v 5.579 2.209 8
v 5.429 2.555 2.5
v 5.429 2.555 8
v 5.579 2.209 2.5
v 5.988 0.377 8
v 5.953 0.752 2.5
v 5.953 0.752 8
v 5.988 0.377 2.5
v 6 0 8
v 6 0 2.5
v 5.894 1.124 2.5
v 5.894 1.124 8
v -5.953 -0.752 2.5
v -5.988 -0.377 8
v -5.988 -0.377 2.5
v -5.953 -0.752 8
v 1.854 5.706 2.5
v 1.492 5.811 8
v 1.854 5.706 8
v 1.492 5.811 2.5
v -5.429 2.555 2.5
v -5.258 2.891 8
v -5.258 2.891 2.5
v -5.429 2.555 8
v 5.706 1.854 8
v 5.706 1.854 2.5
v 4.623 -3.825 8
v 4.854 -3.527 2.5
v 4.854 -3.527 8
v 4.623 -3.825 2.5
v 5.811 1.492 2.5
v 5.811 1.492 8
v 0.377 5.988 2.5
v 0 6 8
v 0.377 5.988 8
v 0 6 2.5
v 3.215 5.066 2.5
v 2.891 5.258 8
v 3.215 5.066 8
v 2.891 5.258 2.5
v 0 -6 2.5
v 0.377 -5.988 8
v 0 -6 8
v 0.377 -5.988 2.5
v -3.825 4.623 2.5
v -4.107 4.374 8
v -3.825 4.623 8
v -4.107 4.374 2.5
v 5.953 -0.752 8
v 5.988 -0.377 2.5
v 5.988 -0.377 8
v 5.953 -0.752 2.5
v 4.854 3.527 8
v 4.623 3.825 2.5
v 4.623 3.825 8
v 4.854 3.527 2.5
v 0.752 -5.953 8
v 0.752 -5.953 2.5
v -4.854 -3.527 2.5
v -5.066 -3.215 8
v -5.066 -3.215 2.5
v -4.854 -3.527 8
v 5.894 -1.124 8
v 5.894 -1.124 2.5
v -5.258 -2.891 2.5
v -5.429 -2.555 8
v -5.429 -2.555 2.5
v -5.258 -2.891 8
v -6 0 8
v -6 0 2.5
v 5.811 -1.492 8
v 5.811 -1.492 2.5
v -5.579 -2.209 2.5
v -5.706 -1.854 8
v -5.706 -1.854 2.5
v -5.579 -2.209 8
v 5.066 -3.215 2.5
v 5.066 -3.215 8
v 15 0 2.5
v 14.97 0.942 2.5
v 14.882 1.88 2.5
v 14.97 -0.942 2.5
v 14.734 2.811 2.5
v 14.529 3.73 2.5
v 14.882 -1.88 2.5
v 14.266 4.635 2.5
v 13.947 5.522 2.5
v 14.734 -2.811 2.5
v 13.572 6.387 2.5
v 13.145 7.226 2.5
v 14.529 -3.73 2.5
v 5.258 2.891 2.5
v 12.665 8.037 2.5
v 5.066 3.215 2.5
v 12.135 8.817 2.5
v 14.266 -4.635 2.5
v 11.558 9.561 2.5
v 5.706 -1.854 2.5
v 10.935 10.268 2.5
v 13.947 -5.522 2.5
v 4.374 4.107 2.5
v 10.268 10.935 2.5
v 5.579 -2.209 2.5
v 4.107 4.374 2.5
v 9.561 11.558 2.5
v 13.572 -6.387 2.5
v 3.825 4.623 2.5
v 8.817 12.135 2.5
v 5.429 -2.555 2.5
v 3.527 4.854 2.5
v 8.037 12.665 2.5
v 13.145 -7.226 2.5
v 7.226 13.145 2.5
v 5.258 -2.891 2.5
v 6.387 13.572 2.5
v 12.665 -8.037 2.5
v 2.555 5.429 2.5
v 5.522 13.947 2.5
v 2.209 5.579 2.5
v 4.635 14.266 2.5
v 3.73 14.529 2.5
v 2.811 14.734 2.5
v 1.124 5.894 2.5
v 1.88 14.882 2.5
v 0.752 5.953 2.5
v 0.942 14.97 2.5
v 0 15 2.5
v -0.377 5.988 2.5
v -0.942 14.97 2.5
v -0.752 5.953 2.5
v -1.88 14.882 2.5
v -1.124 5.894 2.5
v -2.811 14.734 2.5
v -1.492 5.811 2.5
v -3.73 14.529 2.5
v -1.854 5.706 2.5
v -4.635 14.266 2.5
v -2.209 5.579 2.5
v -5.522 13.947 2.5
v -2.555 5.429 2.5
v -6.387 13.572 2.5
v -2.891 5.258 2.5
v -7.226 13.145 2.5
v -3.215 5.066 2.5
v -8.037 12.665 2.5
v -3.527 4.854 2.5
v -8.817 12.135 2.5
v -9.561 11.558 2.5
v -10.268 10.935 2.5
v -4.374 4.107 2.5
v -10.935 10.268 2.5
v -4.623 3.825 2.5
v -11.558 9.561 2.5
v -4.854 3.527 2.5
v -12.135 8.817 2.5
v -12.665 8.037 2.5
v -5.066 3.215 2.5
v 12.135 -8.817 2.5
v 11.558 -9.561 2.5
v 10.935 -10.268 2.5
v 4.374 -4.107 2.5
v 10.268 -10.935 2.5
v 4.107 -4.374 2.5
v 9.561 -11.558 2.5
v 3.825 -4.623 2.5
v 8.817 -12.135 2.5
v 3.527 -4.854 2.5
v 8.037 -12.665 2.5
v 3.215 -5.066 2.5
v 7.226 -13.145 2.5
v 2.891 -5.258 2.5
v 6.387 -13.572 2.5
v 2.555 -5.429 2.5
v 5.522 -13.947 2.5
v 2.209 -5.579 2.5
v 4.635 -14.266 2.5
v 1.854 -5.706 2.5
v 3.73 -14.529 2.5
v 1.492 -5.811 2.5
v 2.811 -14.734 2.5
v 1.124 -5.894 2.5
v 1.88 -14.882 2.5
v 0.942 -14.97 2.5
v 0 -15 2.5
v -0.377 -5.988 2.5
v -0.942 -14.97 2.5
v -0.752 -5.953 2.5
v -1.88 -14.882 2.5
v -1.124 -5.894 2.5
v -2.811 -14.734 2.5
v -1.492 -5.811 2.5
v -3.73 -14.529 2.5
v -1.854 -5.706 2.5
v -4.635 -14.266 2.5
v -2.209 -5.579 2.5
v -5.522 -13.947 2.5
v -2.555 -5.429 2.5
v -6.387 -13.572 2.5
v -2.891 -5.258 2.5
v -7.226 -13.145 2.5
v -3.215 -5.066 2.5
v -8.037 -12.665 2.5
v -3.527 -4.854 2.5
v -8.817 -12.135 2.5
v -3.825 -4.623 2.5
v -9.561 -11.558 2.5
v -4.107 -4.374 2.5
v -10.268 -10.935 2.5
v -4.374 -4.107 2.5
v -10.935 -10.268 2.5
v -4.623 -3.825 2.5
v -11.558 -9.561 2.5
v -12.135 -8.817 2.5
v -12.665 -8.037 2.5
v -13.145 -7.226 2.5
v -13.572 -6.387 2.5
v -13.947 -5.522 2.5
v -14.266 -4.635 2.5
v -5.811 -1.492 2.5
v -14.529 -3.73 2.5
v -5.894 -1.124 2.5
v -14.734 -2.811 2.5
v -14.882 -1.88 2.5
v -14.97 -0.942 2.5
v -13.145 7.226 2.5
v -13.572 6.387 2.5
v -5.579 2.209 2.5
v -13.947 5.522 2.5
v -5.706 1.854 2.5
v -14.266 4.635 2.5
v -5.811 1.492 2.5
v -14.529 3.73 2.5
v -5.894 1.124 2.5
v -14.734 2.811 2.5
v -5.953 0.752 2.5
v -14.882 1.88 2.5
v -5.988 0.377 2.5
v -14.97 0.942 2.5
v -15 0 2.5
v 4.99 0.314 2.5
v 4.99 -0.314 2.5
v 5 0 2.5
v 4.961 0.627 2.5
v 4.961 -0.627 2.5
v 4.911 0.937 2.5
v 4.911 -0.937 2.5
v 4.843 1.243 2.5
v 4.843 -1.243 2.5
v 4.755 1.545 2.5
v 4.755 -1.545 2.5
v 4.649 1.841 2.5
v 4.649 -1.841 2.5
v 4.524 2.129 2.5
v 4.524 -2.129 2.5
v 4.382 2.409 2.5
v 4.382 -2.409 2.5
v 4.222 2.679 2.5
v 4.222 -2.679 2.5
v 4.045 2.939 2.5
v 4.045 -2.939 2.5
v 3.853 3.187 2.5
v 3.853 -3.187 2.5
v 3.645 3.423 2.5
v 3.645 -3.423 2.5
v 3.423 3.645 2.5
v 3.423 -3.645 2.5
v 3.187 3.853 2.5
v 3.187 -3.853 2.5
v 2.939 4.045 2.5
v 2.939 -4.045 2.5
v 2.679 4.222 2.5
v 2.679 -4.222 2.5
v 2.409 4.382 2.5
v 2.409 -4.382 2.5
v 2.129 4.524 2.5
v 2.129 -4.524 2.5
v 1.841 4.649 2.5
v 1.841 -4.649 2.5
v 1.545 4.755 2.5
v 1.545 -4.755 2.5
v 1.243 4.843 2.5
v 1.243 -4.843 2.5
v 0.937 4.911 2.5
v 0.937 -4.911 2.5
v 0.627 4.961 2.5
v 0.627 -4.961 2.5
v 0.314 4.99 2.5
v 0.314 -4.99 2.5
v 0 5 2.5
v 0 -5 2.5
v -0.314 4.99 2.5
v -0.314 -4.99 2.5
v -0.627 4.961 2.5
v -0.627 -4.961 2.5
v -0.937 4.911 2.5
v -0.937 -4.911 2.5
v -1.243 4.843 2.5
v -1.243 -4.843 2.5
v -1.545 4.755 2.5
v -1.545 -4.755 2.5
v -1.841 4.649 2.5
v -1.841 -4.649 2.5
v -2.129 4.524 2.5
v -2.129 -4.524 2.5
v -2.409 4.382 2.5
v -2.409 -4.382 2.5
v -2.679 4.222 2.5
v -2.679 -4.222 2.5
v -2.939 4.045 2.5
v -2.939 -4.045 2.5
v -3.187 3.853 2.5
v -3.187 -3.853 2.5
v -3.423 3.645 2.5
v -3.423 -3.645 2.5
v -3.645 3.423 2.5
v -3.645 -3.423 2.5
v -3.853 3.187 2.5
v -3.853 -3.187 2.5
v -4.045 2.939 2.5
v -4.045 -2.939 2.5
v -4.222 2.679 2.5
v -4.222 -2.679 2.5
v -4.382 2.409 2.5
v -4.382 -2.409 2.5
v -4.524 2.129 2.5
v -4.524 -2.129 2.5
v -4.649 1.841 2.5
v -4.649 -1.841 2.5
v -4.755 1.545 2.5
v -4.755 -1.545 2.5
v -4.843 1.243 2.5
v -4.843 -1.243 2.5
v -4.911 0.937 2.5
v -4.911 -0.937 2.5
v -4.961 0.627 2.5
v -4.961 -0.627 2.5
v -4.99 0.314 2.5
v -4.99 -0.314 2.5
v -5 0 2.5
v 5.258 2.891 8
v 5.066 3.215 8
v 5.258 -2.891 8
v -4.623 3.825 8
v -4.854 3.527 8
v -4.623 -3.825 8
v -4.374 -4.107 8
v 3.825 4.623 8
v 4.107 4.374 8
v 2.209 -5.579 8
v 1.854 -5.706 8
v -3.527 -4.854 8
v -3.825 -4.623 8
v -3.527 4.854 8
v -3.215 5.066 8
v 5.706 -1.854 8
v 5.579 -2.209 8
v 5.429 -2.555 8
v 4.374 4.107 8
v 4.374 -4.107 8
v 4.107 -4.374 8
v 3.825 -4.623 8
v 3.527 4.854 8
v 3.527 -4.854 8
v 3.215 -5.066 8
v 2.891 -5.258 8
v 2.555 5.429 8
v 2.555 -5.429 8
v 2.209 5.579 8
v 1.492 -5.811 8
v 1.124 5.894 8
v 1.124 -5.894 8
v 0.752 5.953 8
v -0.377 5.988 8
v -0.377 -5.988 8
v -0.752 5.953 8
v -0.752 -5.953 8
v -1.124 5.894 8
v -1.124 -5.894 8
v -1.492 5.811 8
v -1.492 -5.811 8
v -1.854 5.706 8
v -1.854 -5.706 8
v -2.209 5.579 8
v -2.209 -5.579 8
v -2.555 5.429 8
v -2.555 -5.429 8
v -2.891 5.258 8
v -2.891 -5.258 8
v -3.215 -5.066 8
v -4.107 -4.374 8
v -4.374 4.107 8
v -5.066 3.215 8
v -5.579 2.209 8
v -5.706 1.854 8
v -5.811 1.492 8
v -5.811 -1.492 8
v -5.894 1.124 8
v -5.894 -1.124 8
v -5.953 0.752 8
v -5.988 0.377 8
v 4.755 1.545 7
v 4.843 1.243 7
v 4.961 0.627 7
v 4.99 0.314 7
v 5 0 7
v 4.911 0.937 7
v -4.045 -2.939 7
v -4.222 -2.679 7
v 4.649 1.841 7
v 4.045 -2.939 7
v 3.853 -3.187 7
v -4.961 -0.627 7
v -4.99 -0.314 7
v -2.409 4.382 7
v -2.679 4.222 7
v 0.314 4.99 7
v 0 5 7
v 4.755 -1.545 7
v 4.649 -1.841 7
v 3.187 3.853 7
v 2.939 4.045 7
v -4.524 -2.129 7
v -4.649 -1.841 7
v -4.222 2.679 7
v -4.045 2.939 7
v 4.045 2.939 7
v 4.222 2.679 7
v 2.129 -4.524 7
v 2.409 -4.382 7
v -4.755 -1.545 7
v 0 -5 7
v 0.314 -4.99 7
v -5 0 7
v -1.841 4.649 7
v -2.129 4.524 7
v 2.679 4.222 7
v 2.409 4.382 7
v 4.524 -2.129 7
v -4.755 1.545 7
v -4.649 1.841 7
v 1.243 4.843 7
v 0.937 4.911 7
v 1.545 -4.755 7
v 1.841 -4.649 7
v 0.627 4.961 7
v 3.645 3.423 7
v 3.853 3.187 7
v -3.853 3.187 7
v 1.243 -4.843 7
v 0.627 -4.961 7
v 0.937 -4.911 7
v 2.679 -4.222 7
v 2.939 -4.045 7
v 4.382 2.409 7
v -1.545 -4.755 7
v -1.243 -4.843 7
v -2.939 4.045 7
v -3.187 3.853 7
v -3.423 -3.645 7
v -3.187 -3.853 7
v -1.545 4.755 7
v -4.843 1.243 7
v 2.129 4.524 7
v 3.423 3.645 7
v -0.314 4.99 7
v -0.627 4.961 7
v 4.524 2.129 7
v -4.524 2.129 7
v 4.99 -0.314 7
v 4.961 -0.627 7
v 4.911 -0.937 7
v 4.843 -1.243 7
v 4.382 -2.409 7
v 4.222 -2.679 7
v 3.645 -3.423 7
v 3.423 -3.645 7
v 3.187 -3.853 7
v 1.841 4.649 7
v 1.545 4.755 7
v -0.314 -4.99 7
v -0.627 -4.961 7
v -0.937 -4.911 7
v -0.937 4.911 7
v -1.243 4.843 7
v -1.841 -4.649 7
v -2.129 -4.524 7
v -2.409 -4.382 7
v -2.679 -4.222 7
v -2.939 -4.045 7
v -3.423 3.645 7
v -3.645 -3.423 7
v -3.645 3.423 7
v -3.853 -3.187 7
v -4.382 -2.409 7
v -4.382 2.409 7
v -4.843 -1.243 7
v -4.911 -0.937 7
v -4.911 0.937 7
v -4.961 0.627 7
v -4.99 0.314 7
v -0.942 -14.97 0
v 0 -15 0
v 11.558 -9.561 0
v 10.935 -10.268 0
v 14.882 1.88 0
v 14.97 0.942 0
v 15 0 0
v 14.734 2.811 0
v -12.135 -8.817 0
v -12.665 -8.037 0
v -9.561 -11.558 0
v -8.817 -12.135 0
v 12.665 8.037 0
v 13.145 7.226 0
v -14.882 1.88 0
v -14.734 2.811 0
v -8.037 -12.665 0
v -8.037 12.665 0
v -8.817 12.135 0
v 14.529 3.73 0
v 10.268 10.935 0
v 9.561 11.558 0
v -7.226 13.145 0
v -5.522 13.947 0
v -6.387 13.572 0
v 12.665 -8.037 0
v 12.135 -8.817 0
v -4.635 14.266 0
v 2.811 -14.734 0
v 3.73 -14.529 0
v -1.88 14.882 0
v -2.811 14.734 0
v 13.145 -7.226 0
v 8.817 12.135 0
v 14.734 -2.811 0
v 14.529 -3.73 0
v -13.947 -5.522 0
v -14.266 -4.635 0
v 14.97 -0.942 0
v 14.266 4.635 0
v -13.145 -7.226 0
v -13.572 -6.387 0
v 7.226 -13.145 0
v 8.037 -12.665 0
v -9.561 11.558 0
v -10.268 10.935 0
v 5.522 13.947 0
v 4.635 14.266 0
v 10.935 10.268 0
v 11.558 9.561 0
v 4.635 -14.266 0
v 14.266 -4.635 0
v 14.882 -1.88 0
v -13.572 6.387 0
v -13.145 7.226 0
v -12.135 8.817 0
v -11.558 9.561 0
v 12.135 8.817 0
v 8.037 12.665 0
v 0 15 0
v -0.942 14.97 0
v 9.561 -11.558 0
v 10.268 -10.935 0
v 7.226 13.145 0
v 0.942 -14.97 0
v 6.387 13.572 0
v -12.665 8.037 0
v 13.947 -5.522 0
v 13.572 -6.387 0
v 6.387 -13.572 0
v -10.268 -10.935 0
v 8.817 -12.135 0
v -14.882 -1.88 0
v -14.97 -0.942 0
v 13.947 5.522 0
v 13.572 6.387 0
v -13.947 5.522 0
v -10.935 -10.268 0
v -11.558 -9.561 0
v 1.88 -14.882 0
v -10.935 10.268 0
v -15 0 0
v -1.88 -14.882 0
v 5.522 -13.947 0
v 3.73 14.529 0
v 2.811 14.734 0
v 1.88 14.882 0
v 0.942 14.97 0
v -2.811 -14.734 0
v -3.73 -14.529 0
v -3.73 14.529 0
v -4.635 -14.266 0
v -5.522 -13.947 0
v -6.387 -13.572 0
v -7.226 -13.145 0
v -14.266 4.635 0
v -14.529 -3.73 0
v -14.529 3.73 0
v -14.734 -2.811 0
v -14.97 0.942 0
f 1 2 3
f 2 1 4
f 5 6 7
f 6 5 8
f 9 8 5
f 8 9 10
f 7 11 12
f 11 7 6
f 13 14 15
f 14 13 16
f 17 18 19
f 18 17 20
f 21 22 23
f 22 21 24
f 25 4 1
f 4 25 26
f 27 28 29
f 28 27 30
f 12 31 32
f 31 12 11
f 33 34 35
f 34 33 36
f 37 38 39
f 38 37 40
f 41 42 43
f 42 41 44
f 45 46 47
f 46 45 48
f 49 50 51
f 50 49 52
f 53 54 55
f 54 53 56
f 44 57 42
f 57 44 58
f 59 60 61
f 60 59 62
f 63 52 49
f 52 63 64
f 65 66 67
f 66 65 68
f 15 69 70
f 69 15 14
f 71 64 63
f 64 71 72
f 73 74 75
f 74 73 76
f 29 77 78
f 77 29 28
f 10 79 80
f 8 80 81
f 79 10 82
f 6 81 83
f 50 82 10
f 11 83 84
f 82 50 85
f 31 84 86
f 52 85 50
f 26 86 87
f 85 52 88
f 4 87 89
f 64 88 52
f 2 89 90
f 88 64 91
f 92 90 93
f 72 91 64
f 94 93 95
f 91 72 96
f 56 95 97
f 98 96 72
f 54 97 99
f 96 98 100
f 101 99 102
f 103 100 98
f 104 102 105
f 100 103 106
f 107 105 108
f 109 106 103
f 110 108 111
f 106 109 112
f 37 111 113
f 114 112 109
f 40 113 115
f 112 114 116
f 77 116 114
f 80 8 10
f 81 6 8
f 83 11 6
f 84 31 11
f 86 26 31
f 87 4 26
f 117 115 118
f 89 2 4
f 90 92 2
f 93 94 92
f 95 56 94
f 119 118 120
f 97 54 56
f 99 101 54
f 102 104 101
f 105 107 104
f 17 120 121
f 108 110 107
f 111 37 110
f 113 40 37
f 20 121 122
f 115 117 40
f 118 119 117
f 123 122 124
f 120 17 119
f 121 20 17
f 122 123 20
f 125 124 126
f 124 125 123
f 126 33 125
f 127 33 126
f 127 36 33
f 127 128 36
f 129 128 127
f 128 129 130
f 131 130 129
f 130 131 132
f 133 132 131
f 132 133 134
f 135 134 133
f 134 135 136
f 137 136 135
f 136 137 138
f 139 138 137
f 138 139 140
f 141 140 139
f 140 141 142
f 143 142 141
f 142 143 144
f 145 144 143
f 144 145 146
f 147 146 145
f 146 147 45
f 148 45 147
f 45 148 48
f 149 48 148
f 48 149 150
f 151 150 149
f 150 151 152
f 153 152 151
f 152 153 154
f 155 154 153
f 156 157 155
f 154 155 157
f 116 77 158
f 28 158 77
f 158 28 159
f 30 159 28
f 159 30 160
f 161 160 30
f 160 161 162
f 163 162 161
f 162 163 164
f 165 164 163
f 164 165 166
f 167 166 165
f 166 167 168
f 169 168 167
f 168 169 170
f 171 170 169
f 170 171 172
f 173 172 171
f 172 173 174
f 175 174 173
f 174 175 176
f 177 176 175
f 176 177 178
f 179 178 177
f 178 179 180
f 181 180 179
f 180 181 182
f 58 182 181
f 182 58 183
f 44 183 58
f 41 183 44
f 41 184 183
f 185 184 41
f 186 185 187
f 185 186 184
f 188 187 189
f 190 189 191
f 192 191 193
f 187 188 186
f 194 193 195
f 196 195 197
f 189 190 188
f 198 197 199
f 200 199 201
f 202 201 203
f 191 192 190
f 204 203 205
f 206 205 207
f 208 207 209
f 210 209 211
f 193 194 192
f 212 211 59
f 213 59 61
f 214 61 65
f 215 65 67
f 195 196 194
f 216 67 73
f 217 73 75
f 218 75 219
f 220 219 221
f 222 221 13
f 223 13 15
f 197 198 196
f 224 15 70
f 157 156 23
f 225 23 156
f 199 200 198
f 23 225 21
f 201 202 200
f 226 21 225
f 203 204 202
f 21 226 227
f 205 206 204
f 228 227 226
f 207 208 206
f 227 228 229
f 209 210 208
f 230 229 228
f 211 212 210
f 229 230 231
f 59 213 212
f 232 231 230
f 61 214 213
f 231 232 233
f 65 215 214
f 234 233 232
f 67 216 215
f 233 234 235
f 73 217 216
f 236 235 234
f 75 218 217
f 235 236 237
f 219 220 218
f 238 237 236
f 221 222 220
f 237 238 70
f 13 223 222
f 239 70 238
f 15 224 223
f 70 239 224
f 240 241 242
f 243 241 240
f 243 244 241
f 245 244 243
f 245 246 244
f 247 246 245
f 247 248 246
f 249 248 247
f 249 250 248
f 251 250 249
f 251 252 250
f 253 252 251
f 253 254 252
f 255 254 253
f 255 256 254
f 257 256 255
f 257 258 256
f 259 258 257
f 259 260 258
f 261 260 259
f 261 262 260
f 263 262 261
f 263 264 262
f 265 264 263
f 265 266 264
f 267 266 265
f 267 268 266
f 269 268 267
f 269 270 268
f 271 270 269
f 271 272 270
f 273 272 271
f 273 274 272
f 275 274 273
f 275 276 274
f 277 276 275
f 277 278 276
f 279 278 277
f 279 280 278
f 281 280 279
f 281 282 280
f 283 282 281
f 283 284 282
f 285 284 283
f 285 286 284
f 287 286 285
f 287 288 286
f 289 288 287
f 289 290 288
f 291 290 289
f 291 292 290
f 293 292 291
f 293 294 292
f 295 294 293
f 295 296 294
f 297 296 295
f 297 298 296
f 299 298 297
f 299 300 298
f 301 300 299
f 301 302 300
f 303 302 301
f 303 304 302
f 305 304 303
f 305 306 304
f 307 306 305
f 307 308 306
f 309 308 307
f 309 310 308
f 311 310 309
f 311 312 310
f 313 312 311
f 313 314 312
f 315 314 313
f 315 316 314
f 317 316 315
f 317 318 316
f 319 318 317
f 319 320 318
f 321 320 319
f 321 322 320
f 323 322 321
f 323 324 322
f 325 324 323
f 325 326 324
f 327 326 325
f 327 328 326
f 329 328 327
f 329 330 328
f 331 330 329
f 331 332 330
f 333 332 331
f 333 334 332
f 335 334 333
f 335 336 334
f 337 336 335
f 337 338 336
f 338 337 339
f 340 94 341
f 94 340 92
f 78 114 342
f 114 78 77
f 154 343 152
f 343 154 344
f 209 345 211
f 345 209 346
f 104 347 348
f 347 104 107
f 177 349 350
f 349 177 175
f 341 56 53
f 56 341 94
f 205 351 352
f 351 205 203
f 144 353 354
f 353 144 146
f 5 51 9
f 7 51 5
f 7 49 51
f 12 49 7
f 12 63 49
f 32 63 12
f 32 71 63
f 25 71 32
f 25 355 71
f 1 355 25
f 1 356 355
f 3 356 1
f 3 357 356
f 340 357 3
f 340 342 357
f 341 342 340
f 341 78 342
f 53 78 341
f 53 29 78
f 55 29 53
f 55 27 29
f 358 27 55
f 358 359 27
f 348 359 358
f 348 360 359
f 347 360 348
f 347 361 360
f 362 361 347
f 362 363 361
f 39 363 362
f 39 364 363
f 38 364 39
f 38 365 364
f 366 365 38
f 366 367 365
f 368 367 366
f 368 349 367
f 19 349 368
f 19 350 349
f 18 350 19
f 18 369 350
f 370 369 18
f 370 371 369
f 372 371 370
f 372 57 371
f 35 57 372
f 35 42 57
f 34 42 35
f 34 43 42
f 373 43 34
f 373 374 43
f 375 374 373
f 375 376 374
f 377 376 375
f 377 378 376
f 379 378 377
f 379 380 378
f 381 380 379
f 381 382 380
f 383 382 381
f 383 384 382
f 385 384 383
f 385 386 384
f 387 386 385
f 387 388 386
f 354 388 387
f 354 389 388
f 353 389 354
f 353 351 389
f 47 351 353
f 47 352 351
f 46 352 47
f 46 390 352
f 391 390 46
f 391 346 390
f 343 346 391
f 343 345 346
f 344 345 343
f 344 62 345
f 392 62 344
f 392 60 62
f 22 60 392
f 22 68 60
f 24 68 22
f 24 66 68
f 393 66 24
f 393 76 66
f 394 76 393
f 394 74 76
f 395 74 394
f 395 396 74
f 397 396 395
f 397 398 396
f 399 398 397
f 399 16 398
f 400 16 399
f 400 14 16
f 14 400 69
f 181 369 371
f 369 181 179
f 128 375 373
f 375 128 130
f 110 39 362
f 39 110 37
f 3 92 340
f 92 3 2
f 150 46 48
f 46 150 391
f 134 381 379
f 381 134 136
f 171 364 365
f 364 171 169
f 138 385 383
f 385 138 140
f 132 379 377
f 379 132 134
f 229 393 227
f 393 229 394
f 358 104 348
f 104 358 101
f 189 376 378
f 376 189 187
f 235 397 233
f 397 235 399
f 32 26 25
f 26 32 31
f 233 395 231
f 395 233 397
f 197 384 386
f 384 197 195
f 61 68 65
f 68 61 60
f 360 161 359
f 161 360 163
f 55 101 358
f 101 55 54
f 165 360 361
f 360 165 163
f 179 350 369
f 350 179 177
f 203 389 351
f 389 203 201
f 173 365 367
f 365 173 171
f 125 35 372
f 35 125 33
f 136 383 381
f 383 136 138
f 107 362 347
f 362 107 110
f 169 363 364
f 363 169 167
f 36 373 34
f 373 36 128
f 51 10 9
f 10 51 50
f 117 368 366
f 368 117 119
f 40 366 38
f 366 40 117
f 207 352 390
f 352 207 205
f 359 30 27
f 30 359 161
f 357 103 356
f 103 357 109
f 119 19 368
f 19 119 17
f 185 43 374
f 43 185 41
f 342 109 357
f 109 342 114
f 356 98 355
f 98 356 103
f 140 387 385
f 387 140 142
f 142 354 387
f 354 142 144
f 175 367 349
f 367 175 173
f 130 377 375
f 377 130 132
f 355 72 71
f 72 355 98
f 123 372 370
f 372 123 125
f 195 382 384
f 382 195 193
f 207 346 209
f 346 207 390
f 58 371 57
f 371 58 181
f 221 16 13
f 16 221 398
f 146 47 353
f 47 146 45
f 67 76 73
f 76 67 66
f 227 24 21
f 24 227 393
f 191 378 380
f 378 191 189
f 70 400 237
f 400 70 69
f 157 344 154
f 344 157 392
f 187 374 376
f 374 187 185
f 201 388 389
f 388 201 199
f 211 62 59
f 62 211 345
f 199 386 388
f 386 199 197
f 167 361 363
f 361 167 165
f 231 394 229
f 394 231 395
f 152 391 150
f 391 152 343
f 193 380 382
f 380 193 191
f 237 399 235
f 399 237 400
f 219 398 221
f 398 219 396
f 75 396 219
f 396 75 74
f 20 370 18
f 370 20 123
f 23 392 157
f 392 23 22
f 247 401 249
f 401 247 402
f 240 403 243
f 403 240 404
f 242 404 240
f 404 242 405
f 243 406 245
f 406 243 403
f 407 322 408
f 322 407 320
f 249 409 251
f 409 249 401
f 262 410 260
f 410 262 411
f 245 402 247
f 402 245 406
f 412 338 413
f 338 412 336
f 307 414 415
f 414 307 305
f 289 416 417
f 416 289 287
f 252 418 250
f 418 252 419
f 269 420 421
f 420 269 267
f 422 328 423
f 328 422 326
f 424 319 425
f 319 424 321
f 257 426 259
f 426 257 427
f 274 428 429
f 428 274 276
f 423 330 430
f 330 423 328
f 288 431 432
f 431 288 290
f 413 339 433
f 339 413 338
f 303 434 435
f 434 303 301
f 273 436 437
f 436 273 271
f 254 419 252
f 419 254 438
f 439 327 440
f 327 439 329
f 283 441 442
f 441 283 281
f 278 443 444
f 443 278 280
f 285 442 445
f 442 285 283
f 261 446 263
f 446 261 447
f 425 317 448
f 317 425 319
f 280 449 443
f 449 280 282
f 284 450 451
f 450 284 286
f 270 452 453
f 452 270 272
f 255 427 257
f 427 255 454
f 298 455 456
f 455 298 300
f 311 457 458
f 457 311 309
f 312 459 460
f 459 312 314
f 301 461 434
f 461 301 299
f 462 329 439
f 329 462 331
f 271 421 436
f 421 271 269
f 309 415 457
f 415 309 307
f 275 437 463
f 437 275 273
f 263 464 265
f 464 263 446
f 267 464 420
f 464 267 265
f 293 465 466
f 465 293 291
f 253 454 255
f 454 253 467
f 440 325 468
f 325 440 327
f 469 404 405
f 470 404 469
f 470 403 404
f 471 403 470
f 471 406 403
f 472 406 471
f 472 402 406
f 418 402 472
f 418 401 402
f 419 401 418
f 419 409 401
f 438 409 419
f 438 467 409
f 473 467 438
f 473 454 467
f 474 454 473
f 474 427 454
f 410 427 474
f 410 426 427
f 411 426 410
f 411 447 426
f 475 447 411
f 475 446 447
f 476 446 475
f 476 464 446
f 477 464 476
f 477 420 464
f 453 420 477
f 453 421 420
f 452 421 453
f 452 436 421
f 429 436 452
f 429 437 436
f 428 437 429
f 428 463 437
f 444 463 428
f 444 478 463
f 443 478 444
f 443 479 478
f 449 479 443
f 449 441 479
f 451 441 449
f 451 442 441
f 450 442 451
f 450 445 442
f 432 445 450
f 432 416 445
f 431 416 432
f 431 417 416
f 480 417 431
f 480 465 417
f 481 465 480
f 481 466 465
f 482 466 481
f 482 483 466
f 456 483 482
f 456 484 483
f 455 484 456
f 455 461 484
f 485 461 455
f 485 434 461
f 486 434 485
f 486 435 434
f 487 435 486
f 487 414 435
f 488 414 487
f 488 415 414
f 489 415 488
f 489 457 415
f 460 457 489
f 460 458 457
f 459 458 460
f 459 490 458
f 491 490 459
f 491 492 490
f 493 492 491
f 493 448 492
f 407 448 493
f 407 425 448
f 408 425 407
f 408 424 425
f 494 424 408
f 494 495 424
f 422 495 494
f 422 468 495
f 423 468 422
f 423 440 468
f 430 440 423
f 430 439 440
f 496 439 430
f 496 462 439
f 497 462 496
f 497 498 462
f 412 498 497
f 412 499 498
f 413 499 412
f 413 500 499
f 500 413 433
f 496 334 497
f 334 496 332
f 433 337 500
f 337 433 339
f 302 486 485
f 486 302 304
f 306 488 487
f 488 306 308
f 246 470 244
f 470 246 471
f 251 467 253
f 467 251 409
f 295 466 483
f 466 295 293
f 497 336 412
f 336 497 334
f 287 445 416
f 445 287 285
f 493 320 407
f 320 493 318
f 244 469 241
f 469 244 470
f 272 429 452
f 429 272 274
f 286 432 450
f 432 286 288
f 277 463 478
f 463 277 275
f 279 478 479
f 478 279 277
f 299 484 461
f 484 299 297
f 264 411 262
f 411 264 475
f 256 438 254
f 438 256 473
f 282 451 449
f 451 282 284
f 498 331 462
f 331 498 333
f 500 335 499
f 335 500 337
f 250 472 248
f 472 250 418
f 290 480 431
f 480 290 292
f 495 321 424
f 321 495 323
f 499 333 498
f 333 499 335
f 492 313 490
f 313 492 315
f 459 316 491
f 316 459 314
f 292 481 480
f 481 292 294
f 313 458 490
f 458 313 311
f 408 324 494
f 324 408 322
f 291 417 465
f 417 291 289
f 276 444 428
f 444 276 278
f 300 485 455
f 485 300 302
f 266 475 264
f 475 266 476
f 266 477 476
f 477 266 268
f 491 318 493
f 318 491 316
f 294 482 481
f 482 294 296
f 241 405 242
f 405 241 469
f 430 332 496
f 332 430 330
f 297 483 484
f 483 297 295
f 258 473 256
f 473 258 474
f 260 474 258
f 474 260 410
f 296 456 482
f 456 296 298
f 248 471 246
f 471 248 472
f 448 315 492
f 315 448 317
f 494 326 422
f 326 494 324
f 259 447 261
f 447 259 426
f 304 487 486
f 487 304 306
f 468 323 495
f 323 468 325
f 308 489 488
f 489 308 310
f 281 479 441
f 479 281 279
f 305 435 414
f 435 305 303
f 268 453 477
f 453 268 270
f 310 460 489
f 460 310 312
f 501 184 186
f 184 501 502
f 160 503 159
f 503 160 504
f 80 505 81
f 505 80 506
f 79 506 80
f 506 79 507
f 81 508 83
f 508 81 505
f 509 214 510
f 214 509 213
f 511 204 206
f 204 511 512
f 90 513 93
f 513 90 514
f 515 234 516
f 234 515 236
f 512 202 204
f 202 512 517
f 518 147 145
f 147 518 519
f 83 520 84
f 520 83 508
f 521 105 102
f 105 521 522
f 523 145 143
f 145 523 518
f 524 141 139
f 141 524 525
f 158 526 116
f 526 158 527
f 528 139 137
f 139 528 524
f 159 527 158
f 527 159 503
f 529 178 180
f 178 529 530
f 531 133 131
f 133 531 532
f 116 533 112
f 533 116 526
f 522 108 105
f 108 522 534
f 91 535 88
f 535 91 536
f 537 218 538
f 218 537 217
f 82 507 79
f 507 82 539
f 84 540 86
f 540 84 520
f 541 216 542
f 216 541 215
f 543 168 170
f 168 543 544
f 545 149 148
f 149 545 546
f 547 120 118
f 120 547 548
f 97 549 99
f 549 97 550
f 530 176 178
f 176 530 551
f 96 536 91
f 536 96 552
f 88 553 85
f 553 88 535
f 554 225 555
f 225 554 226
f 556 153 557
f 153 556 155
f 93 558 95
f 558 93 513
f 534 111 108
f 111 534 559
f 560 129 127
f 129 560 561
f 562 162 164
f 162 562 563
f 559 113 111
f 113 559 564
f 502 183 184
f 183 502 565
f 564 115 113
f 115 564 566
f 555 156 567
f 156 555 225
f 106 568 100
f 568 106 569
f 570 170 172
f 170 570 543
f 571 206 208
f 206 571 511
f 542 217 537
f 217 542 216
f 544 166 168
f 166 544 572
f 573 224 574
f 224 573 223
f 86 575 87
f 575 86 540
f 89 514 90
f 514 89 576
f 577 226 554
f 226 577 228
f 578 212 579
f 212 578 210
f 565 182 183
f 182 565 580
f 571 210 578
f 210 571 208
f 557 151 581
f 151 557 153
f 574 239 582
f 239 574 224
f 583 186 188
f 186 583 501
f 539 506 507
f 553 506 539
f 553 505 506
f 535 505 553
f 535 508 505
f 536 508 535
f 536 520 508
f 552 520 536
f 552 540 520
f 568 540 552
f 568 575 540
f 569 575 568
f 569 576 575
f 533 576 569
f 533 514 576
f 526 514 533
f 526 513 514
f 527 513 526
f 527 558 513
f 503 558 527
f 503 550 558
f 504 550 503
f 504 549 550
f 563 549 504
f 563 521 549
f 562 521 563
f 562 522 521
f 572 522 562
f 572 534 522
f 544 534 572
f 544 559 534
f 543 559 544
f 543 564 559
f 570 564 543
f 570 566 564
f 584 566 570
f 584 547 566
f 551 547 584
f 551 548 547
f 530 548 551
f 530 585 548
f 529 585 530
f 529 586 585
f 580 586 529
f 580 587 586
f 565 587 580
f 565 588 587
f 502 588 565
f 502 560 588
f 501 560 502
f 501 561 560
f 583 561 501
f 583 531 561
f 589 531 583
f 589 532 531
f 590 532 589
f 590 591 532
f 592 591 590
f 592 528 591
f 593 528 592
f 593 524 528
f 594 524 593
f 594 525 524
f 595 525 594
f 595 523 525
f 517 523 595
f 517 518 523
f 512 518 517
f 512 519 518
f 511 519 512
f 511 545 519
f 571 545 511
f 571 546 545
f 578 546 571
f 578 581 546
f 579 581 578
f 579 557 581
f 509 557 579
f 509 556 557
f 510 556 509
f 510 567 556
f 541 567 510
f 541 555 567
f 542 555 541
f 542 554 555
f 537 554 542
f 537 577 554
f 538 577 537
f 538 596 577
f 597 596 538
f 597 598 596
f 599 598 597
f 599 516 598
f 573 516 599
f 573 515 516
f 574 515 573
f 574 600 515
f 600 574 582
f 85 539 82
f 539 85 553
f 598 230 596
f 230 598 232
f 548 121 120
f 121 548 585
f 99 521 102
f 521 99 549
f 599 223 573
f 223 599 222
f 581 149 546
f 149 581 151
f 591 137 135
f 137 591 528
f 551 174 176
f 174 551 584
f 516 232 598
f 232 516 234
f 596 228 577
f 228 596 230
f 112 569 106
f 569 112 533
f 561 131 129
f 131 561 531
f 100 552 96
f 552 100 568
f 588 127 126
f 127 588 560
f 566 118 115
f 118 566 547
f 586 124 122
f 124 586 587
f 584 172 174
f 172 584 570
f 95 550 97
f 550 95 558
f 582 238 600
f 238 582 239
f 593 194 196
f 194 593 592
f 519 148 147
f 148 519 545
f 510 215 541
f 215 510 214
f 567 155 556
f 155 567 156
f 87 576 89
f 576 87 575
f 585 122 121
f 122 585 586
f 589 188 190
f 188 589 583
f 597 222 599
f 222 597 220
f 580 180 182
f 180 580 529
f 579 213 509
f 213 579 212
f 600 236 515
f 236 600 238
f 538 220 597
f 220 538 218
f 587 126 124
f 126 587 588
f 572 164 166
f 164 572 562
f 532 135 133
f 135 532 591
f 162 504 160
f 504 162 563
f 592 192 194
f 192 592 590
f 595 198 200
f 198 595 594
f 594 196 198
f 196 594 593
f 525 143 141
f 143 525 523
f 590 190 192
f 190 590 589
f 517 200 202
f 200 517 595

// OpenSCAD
cylinder(h=2.5, r=15, $fn=100);
translate([0,0,2.5]) {
  difference() {
    cylinder(h=5.5, r=6, $fn=100);
    cylinder(h=4.5, r=5, $fn=100);
  };
};
